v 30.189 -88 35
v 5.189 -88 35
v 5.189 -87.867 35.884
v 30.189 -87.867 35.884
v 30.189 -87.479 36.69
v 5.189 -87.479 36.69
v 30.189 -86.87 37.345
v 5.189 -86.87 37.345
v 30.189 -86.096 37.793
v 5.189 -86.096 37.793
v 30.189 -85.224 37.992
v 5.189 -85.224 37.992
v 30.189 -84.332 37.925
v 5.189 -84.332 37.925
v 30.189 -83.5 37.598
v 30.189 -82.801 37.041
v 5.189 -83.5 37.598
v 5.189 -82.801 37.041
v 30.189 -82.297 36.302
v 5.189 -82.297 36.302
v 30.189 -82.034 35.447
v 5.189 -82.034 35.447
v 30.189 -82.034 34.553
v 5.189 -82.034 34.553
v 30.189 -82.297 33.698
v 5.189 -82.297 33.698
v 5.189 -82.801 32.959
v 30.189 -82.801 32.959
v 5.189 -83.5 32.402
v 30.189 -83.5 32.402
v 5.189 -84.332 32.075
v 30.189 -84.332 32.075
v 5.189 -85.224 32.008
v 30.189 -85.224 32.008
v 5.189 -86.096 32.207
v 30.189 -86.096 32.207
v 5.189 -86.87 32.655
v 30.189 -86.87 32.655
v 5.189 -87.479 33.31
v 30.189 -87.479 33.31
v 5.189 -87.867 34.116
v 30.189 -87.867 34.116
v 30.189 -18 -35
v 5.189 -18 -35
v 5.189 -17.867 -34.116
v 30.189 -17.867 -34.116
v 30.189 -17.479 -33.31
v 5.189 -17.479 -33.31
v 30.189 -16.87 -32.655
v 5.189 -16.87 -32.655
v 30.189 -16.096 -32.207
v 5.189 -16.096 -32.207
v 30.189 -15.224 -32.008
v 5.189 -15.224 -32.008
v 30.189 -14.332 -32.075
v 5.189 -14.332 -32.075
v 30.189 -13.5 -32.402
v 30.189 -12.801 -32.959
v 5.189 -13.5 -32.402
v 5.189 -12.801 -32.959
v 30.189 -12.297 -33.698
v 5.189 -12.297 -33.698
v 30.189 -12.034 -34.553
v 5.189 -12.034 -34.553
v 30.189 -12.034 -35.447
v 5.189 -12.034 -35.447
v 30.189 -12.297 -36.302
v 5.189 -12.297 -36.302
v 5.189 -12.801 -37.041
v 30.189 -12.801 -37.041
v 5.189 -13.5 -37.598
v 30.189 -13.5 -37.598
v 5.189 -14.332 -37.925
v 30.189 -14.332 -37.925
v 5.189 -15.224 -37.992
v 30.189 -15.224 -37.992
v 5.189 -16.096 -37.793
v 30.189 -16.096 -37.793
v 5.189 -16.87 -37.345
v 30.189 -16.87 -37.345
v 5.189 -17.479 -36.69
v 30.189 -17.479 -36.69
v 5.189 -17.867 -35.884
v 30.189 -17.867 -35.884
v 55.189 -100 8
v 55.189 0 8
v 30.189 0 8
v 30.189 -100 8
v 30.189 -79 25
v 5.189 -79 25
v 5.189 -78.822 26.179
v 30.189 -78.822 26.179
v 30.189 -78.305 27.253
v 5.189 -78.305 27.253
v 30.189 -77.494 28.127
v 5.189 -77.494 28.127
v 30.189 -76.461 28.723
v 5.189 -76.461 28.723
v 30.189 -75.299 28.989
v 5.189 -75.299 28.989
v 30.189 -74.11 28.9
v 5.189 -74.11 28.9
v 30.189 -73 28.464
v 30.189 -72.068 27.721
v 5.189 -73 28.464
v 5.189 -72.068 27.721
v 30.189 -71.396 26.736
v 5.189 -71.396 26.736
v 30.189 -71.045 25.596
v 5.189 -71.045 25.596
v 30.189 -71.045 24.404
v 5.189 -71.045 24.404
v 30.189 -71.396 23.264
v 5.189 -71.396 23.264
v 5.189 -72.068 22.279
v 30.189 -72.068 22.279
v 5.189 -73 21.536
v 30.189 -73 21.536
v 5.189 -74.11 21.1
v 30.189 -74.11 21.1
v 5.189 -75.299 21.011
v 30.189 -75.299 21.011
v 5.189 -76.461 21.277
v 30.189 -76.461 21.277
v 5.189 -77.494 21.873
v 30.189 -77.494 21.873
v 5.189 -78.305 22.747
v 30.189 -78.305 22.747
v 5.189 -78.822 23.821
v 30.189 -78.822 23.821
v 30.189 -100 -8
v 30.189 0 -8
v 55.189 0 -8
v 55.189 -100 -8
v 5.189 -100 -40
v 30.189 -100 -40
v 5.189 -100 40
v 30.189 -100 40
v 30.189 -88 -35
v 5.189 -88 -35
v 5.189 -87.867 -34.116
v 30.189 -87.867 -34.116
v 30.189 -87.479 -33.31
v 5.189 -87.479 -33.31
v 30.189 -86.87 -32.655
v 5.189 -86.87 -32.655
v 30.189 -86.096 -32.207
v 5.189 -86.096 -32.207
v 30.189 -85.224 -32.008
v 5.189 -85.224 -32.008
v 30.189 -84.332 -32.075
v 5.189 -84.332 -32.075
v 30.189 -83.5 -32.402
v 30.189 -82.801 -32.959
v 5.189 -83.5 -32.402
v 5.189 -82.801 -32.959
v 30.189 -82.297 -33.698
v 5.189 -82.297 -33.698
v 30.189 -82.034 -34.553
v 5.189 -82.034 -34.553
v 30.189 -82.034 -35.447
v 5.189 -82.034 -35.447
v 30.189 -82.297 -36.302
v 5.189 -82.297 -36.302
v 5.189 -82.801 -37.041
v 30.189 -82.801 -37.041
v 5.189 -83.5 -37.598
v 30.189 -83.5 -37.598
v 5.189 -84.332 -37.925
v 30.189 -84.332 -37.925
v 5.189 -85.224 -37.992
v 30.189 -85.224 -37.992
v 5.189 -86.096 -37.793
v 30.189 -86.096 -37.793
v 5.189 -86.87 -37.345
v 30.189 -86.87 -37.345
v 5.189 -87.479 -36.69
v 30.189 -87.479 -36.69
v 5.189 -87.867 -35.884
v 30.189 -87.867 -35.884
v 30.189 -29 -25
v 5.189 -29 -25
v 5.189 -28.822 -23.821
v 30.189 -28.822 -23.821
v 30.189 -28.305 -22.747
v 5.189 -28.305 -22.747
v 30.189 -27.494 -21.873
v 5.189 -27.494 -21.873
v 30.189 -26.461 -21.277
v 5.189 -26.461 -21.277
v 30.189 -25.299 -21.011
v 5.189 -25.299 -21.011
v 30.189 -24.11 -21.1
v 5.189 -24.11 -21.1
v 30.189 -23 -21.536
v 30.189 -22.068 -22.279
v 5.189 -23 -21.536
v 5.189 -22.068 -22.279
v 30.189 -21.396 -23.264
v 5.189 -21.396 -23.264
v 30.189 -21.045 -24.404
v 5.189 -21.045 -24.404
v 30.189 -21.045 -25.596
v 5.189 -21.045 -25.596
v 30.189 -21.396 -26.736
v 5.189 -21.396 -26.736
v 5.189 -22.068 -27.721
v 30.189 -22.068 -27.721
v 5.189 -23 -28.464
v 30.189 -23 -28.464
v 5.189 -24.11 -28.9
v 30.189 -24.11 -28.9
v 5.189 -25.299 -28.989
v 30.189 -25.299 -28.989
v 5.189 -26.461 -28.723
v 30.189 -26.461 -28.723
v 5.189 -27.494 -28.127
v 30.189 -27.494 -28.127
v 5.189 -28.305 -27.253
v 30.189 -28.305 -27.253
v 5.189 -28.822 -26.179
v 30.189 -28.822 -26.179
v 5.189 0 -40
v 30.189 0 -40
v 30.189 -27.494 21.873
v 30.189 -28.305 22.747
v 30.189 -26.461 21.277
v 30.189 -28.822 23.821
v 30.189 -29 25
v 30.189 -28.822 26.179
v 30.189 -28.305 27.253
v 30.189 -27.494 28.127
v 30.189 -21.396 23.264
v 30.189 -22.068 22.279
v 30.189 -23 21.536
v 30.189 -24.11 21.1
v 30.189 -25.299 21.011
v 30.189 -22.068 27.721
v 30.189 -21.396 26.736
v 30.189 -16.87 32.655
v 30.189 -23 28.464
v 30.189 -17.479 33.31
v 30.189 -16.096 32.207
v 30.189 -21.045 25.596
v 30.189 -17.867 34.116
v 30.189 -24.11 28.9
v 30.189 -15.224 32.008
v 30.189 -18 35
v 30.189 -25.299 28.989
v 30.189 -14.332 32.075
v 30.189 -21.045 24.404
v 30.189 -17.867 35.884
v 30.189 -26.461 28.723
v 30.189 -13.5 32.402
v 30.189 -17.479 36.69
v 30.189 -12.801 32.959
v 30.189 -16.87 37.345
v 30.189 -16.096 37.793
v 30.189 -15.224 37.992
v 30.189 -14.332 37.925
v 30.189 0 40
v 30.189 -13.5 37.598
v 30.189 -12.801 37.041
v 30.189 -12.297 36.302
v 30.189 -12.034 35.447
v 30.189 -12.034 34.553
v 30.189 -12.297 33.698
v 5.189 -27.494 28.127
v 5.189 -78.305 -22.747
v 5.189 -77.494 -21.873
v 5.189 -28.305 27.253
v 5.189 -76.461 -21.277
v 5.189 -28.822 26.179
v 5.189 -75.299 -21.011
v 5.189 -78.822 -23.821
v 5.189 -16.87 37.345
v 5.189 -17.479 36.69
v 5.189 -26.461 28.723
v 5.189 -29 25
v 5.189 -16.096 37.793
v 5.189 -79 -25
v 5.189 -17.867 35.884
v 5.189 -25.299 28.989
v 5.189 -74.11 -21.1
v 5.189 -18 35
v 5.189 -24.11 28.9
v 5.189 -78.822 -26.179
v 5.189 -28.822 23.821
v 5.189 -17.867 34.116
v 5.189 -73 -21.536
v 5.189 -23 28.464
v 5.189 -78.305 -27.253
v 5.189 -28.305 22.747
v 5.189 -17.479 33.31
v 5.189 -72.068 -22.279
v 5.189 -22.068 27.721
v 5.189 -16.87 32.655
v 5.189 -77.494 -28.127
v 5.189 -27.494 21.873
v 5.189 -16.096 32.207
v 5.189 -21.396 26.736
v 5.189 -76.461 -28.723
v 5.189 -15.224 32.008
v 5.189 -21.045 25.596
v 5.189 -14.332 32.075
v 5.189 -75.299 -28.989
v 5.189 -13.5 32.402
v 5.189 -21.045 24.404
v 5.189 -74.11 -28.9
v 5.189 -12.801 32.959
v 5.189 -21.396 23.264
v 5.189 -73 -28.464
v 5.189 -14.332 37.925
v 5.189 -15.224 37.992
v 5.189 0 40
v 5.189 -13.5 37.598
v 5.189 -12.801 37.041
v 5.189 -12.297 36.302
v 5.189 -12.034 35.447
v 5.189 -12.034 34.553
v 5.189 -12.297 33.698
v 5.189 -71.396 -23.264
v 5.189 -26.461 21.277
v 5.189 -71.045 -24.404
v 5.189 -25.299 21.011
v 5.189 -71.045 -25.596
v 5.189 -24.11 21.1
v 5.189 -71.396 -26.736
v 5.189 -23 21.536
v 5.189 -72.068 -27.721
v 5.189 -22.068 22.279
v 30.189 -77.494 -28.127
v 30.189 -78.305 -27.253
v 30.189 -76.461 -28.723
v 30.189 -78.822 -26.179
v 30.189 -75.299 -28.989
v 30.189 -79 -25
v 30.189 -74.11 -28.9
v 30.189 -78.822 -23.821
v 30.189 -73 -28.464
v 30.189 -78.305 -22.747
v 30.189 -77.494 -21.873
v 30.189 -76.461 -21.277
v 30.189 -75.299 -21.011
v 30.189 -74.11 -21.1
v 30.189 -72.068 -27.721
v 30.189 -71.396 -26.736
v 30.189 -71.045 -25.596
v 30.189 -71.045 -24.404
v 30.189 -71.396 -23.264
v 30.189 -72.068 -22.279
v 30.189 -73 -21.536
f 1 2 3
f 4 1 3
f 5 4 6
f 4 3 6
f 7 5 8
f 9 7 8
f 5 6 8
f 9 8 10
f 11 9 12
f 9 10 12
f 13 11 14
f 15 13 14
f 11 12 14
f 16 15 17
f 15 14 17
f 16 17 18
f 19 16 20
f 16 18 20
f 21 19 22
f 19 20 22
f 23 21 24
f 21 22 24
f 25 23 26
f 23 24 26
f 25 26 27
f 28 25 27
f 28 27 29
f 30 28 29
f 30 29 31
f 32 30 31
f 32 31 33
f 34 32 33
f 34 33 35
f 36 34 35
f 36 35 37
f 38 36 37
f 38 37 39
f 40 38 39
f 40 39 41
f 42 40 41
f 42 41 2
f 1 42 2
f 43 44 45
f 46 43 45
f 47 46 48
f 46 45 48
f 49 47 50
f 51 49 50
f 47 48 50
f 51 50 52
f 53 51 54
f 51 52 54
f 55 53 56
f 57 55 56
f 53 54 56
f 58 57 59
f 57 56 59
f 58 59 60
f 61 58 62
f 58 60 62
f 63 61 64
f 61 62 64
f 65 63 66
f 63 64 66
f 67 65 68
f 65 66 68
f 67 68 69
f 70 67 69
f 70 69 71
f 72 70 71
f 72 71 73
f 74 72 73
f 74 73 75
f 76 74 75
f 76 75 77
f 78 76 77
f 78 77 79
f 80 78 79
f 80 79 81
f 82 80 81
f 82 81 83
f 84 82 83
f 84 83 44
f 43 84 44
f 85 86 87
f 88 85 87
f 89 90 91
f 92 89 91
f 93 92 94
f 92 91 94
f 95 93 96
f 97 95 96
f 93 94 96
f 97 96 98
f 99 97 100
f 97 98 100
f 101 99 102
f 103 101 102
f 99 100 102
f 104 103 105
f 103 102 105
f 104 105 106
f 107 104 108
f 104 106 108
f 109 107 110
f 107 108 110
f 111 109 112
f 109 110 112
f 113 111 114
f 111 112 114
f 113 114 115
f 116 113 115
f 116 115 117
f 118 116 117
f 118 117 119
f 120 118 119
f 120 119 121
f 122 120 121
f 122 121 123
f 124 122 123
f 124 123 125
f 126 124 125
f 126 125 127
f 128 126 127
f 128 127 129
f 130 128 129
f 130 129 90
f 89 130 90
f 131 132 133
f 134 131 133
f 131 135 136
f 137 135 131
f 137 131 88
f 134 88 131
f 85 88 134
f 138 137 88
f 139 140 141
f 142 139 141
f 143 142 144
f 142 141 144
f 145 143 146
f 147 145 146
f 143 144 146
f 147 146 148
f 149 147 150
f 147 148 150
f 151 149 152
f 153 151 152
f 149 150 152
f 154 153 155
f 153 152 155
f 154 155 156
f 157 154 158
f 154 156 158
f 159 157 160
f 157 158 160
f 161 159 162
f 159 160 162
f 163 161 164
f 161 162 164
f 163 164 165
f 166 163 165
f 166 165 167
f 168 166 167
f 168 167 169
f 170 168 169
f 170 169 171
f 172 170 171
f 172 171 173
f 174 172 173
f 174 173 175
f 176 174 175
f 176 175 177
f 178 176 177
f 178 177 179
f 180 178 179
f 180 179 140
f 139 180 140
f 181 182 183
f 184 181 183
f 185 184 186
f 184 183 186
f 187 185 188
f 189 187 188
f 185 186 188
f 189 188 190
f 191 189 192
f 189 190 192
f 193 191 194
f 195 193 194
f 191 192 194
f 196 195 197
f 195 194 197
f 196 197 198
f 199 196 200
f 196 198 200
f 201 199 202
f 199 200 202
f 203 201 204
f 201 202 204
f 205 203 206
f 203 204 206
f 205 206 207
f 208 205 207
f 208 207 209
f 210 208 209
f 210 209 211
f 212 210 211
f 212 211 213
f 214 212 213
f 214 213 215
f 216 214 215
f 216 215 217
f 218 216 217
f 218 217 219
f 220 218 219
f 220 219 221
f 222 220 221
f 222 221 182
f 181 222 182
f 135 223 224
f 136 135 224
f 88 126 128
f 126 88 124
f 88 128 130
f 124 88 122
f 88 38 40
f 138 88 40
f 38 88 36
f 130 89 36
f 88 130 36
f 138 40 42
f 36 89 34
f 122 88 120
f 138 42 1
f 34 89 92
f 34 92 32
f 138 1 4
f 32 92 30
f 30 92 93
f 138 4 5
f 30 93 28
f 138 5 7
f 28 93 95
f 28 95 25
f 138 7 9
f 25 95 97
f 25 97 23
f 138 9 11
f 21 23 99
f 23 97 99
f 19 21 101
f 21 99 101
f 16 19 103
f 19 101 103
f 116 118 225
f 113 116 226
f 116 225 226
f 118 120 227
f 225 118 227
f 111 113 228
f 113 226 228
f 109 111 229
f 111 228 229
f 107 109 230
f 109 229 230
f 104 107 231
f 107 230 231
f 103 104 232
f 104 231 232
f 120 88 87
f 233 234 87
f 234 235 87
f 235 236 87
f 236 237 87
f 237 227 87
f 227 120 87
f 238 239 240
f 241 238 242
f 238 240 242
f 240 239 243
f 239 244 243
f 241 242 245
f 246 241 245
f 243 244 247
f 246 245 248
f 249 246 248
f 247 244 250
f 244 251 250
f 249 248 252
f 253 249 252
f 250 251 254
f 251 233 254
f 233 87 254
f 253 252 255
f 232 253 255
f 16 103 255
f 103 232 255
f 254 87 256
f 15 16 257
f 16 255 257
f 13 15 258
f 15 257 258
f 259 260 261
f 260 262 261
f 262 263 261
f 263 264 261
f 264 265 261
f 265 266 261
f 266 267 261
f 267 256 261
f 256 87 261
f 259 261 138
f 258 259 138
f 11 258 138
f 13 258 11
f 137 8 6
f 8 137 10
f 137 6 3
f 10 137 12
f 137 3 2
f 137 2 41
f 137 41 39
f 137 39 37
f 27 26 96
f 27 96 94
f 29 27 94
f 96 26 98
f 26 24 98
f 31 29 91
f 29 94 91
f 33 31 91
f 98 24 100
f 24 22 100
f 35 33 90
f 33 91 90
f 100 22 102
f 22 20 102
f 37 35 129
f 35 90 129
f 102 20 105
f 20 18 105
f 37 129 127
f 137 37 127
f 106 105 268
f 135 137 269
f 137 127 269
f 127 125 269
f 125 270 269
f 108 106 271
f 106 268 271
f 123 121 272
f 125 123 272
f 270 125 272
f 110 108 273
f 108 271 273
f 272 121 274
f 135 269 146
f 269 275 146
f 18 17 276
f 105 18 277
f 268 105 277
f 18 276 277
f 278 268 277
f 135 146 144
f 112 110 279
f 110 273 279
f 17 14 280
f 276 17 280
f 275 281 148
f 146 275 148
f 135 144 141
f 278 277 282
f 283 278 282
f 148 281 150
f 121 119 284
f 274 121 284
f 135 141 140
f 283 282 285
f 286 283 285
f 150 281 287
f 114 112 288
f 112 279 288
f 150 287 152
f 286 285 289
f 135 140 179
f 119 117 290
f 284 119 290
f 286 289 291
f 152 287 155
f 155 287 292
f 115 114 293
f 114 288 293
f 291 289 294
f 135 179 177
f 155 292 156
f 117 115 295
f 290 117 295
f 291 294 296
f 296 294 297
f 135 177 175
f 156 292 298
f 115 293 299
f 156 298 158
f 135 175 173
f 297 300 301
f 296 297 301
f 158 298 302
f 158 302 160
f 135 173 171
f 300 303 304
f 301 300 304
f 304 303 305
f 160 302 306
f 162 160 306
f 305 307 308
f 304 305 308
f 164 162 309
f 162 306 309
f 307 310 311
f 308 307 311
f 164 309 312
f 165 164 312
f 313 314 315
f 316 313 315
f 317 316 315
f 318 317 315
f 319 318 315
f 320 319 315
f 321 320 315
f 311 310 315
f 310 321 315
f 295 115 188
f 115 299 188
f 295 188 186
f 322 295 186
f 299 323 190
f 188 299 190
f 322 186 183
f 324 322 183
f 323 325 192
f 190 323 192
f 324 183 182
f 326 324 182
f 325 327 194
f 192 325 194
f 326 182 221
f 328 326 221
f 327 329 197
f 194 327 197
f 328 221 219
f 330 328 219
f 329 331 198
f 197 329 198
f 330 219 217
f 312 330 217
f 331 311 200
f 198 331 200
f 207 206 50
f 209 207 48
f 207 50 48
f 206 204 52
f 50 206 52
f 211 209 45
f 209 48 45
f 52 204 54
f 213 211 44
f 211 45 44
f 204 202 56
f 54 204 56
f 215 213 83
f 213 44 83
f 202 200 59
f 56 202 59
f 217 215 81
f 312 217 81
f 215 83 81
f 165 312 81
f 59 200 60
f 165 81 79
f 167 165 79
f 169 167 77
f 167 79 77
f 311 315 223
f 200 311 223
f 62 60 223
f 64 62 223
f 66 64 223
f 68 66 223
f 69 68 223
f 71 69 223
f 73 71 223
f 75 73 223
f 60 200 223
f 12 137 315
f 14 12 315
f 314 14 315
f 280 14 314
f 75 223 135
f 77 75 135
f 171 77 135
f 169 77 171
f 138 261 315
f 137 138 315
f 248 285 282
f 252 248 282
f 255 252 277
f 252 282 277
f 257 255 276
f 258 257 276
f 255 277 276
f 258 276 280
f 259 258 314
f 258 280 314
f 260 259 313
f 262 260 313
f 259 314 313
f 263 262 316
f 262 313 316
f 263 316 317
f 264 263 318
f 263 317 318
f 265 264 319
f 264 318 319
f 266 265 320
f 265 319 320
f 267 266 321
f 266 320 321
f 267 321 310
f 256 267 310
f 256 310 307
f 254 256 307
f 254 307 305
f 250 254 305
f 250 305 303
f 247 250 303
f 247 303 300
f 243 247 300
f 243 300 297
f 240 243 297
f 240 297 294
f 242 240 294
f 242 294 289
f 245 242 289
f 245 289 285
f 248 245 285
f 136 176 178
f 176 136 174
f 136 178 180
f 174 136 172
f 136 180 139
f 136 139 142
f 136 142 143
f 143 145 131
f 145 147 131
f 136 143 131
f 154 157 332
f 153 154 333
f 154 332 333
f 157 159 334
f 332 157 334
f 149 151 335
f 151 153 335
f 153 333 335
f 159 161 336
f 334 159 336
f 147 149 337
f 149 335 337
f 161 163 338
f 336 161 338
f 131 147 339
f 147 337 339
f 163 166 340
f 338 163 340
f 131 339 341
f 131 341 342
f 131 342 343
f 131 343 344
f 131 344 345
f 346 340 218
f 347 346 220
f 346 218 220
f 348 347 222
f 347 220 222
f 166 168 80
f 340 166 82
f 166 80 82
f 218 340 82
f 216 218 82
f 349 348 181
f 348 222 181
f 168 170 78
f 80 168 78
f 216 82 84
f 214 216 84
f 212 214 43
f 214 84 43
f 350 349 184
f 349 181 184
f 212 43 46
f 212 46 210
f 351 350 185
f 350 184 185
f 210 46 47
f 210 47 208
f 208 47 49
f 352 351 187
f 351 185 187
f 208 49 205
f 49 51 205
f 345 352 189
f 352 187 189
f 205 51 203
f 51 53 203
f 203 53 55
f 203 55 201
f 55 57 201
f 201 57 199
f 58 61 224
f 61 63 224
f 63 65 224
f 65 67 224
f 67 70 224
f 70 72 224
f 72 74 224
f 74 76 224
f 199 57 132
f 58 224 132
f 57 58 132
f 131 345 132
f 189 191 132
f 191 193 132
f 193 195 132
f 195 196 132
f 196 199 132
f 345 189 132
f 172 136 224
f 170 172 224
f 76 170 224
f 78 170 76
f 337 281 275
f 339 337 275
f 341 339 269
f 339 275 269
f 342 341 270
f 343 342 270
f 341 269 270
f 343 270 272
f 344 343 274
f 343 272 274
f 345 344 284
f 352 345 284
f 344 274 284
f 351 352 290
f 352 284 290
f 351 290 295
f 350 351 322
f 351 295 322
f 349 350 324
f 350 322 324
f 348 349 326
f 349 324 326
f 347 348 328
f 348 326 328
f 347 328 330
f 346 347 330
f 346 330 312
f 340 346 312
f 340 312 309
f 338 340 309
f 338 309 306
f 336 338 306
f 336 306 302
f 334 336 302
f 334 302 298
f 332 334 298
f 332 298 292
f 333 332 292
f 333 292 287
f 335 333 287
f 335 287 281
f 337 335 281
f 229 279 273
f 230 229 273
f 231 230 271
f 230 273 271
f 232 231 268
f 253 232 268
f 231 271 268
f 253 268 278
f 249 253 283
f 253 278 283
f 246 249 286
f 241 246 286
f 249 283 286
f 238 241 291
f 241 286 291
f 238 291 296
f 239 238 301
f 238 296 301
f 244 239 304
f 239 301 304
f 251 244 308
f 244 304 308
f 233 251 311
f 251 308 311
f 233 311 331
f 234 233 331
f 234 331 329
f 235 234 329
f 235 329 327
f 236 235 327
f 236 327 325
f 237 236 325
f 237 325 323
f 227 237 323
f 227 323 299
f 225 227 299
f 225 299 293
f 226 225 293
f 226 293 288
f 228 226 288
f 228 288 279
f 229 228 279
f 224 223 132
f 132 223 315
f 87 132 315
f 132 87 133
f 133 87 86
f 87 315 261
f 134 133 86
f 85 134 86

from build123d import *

# Parameters (mm, degrees)
F1_DEPTH = 100
F2_R     = 4
F2_R_2   = 3
F3_DEPTH = 100


with BuildPart() as f1:
    # F0 (on Front) → F1 (new body)
    with BuildSketch(Plane.XZ):
        Polygon((5.189254, 40), (5.189254, 0), (5.189254, -40), (30.189254, -40), (30.189254, -8), (55.189254, -8), (55.189254, 8), (30.189254, 8), (30.189254, 40), align=None)
    extrude(amount=F1_DEPTH)

    # F2 (on face) → F3 (cut)
    with BuildSketch(Plane(origin=(5.189254, 0, 0), x_dir=(0, -1, 0), z_dir=(-1, 0, 0))):
        with Locations((25, 25)):
            Circle(F2_R)
        with Locations((75, 25)):
            Circle(F2_R)
        with Locations((25, -25)):
            Circle(F2_R)
        with Locations((75, -25)):
            Circle(F2_R)
        with Locations((15, 35)):
            Circle(F2_R_2)
        with Locations((85, 35)):
            Circle(F2_R_2)
        with Locations((15, -35)):
            Circle(F2_R_2)
        with Locations((85, -35)):
            Circle(F2_R_2)
    extrude(amount=-F3_DEPTH, mode=Mode.SUBTRACT)


solid = f1.part
